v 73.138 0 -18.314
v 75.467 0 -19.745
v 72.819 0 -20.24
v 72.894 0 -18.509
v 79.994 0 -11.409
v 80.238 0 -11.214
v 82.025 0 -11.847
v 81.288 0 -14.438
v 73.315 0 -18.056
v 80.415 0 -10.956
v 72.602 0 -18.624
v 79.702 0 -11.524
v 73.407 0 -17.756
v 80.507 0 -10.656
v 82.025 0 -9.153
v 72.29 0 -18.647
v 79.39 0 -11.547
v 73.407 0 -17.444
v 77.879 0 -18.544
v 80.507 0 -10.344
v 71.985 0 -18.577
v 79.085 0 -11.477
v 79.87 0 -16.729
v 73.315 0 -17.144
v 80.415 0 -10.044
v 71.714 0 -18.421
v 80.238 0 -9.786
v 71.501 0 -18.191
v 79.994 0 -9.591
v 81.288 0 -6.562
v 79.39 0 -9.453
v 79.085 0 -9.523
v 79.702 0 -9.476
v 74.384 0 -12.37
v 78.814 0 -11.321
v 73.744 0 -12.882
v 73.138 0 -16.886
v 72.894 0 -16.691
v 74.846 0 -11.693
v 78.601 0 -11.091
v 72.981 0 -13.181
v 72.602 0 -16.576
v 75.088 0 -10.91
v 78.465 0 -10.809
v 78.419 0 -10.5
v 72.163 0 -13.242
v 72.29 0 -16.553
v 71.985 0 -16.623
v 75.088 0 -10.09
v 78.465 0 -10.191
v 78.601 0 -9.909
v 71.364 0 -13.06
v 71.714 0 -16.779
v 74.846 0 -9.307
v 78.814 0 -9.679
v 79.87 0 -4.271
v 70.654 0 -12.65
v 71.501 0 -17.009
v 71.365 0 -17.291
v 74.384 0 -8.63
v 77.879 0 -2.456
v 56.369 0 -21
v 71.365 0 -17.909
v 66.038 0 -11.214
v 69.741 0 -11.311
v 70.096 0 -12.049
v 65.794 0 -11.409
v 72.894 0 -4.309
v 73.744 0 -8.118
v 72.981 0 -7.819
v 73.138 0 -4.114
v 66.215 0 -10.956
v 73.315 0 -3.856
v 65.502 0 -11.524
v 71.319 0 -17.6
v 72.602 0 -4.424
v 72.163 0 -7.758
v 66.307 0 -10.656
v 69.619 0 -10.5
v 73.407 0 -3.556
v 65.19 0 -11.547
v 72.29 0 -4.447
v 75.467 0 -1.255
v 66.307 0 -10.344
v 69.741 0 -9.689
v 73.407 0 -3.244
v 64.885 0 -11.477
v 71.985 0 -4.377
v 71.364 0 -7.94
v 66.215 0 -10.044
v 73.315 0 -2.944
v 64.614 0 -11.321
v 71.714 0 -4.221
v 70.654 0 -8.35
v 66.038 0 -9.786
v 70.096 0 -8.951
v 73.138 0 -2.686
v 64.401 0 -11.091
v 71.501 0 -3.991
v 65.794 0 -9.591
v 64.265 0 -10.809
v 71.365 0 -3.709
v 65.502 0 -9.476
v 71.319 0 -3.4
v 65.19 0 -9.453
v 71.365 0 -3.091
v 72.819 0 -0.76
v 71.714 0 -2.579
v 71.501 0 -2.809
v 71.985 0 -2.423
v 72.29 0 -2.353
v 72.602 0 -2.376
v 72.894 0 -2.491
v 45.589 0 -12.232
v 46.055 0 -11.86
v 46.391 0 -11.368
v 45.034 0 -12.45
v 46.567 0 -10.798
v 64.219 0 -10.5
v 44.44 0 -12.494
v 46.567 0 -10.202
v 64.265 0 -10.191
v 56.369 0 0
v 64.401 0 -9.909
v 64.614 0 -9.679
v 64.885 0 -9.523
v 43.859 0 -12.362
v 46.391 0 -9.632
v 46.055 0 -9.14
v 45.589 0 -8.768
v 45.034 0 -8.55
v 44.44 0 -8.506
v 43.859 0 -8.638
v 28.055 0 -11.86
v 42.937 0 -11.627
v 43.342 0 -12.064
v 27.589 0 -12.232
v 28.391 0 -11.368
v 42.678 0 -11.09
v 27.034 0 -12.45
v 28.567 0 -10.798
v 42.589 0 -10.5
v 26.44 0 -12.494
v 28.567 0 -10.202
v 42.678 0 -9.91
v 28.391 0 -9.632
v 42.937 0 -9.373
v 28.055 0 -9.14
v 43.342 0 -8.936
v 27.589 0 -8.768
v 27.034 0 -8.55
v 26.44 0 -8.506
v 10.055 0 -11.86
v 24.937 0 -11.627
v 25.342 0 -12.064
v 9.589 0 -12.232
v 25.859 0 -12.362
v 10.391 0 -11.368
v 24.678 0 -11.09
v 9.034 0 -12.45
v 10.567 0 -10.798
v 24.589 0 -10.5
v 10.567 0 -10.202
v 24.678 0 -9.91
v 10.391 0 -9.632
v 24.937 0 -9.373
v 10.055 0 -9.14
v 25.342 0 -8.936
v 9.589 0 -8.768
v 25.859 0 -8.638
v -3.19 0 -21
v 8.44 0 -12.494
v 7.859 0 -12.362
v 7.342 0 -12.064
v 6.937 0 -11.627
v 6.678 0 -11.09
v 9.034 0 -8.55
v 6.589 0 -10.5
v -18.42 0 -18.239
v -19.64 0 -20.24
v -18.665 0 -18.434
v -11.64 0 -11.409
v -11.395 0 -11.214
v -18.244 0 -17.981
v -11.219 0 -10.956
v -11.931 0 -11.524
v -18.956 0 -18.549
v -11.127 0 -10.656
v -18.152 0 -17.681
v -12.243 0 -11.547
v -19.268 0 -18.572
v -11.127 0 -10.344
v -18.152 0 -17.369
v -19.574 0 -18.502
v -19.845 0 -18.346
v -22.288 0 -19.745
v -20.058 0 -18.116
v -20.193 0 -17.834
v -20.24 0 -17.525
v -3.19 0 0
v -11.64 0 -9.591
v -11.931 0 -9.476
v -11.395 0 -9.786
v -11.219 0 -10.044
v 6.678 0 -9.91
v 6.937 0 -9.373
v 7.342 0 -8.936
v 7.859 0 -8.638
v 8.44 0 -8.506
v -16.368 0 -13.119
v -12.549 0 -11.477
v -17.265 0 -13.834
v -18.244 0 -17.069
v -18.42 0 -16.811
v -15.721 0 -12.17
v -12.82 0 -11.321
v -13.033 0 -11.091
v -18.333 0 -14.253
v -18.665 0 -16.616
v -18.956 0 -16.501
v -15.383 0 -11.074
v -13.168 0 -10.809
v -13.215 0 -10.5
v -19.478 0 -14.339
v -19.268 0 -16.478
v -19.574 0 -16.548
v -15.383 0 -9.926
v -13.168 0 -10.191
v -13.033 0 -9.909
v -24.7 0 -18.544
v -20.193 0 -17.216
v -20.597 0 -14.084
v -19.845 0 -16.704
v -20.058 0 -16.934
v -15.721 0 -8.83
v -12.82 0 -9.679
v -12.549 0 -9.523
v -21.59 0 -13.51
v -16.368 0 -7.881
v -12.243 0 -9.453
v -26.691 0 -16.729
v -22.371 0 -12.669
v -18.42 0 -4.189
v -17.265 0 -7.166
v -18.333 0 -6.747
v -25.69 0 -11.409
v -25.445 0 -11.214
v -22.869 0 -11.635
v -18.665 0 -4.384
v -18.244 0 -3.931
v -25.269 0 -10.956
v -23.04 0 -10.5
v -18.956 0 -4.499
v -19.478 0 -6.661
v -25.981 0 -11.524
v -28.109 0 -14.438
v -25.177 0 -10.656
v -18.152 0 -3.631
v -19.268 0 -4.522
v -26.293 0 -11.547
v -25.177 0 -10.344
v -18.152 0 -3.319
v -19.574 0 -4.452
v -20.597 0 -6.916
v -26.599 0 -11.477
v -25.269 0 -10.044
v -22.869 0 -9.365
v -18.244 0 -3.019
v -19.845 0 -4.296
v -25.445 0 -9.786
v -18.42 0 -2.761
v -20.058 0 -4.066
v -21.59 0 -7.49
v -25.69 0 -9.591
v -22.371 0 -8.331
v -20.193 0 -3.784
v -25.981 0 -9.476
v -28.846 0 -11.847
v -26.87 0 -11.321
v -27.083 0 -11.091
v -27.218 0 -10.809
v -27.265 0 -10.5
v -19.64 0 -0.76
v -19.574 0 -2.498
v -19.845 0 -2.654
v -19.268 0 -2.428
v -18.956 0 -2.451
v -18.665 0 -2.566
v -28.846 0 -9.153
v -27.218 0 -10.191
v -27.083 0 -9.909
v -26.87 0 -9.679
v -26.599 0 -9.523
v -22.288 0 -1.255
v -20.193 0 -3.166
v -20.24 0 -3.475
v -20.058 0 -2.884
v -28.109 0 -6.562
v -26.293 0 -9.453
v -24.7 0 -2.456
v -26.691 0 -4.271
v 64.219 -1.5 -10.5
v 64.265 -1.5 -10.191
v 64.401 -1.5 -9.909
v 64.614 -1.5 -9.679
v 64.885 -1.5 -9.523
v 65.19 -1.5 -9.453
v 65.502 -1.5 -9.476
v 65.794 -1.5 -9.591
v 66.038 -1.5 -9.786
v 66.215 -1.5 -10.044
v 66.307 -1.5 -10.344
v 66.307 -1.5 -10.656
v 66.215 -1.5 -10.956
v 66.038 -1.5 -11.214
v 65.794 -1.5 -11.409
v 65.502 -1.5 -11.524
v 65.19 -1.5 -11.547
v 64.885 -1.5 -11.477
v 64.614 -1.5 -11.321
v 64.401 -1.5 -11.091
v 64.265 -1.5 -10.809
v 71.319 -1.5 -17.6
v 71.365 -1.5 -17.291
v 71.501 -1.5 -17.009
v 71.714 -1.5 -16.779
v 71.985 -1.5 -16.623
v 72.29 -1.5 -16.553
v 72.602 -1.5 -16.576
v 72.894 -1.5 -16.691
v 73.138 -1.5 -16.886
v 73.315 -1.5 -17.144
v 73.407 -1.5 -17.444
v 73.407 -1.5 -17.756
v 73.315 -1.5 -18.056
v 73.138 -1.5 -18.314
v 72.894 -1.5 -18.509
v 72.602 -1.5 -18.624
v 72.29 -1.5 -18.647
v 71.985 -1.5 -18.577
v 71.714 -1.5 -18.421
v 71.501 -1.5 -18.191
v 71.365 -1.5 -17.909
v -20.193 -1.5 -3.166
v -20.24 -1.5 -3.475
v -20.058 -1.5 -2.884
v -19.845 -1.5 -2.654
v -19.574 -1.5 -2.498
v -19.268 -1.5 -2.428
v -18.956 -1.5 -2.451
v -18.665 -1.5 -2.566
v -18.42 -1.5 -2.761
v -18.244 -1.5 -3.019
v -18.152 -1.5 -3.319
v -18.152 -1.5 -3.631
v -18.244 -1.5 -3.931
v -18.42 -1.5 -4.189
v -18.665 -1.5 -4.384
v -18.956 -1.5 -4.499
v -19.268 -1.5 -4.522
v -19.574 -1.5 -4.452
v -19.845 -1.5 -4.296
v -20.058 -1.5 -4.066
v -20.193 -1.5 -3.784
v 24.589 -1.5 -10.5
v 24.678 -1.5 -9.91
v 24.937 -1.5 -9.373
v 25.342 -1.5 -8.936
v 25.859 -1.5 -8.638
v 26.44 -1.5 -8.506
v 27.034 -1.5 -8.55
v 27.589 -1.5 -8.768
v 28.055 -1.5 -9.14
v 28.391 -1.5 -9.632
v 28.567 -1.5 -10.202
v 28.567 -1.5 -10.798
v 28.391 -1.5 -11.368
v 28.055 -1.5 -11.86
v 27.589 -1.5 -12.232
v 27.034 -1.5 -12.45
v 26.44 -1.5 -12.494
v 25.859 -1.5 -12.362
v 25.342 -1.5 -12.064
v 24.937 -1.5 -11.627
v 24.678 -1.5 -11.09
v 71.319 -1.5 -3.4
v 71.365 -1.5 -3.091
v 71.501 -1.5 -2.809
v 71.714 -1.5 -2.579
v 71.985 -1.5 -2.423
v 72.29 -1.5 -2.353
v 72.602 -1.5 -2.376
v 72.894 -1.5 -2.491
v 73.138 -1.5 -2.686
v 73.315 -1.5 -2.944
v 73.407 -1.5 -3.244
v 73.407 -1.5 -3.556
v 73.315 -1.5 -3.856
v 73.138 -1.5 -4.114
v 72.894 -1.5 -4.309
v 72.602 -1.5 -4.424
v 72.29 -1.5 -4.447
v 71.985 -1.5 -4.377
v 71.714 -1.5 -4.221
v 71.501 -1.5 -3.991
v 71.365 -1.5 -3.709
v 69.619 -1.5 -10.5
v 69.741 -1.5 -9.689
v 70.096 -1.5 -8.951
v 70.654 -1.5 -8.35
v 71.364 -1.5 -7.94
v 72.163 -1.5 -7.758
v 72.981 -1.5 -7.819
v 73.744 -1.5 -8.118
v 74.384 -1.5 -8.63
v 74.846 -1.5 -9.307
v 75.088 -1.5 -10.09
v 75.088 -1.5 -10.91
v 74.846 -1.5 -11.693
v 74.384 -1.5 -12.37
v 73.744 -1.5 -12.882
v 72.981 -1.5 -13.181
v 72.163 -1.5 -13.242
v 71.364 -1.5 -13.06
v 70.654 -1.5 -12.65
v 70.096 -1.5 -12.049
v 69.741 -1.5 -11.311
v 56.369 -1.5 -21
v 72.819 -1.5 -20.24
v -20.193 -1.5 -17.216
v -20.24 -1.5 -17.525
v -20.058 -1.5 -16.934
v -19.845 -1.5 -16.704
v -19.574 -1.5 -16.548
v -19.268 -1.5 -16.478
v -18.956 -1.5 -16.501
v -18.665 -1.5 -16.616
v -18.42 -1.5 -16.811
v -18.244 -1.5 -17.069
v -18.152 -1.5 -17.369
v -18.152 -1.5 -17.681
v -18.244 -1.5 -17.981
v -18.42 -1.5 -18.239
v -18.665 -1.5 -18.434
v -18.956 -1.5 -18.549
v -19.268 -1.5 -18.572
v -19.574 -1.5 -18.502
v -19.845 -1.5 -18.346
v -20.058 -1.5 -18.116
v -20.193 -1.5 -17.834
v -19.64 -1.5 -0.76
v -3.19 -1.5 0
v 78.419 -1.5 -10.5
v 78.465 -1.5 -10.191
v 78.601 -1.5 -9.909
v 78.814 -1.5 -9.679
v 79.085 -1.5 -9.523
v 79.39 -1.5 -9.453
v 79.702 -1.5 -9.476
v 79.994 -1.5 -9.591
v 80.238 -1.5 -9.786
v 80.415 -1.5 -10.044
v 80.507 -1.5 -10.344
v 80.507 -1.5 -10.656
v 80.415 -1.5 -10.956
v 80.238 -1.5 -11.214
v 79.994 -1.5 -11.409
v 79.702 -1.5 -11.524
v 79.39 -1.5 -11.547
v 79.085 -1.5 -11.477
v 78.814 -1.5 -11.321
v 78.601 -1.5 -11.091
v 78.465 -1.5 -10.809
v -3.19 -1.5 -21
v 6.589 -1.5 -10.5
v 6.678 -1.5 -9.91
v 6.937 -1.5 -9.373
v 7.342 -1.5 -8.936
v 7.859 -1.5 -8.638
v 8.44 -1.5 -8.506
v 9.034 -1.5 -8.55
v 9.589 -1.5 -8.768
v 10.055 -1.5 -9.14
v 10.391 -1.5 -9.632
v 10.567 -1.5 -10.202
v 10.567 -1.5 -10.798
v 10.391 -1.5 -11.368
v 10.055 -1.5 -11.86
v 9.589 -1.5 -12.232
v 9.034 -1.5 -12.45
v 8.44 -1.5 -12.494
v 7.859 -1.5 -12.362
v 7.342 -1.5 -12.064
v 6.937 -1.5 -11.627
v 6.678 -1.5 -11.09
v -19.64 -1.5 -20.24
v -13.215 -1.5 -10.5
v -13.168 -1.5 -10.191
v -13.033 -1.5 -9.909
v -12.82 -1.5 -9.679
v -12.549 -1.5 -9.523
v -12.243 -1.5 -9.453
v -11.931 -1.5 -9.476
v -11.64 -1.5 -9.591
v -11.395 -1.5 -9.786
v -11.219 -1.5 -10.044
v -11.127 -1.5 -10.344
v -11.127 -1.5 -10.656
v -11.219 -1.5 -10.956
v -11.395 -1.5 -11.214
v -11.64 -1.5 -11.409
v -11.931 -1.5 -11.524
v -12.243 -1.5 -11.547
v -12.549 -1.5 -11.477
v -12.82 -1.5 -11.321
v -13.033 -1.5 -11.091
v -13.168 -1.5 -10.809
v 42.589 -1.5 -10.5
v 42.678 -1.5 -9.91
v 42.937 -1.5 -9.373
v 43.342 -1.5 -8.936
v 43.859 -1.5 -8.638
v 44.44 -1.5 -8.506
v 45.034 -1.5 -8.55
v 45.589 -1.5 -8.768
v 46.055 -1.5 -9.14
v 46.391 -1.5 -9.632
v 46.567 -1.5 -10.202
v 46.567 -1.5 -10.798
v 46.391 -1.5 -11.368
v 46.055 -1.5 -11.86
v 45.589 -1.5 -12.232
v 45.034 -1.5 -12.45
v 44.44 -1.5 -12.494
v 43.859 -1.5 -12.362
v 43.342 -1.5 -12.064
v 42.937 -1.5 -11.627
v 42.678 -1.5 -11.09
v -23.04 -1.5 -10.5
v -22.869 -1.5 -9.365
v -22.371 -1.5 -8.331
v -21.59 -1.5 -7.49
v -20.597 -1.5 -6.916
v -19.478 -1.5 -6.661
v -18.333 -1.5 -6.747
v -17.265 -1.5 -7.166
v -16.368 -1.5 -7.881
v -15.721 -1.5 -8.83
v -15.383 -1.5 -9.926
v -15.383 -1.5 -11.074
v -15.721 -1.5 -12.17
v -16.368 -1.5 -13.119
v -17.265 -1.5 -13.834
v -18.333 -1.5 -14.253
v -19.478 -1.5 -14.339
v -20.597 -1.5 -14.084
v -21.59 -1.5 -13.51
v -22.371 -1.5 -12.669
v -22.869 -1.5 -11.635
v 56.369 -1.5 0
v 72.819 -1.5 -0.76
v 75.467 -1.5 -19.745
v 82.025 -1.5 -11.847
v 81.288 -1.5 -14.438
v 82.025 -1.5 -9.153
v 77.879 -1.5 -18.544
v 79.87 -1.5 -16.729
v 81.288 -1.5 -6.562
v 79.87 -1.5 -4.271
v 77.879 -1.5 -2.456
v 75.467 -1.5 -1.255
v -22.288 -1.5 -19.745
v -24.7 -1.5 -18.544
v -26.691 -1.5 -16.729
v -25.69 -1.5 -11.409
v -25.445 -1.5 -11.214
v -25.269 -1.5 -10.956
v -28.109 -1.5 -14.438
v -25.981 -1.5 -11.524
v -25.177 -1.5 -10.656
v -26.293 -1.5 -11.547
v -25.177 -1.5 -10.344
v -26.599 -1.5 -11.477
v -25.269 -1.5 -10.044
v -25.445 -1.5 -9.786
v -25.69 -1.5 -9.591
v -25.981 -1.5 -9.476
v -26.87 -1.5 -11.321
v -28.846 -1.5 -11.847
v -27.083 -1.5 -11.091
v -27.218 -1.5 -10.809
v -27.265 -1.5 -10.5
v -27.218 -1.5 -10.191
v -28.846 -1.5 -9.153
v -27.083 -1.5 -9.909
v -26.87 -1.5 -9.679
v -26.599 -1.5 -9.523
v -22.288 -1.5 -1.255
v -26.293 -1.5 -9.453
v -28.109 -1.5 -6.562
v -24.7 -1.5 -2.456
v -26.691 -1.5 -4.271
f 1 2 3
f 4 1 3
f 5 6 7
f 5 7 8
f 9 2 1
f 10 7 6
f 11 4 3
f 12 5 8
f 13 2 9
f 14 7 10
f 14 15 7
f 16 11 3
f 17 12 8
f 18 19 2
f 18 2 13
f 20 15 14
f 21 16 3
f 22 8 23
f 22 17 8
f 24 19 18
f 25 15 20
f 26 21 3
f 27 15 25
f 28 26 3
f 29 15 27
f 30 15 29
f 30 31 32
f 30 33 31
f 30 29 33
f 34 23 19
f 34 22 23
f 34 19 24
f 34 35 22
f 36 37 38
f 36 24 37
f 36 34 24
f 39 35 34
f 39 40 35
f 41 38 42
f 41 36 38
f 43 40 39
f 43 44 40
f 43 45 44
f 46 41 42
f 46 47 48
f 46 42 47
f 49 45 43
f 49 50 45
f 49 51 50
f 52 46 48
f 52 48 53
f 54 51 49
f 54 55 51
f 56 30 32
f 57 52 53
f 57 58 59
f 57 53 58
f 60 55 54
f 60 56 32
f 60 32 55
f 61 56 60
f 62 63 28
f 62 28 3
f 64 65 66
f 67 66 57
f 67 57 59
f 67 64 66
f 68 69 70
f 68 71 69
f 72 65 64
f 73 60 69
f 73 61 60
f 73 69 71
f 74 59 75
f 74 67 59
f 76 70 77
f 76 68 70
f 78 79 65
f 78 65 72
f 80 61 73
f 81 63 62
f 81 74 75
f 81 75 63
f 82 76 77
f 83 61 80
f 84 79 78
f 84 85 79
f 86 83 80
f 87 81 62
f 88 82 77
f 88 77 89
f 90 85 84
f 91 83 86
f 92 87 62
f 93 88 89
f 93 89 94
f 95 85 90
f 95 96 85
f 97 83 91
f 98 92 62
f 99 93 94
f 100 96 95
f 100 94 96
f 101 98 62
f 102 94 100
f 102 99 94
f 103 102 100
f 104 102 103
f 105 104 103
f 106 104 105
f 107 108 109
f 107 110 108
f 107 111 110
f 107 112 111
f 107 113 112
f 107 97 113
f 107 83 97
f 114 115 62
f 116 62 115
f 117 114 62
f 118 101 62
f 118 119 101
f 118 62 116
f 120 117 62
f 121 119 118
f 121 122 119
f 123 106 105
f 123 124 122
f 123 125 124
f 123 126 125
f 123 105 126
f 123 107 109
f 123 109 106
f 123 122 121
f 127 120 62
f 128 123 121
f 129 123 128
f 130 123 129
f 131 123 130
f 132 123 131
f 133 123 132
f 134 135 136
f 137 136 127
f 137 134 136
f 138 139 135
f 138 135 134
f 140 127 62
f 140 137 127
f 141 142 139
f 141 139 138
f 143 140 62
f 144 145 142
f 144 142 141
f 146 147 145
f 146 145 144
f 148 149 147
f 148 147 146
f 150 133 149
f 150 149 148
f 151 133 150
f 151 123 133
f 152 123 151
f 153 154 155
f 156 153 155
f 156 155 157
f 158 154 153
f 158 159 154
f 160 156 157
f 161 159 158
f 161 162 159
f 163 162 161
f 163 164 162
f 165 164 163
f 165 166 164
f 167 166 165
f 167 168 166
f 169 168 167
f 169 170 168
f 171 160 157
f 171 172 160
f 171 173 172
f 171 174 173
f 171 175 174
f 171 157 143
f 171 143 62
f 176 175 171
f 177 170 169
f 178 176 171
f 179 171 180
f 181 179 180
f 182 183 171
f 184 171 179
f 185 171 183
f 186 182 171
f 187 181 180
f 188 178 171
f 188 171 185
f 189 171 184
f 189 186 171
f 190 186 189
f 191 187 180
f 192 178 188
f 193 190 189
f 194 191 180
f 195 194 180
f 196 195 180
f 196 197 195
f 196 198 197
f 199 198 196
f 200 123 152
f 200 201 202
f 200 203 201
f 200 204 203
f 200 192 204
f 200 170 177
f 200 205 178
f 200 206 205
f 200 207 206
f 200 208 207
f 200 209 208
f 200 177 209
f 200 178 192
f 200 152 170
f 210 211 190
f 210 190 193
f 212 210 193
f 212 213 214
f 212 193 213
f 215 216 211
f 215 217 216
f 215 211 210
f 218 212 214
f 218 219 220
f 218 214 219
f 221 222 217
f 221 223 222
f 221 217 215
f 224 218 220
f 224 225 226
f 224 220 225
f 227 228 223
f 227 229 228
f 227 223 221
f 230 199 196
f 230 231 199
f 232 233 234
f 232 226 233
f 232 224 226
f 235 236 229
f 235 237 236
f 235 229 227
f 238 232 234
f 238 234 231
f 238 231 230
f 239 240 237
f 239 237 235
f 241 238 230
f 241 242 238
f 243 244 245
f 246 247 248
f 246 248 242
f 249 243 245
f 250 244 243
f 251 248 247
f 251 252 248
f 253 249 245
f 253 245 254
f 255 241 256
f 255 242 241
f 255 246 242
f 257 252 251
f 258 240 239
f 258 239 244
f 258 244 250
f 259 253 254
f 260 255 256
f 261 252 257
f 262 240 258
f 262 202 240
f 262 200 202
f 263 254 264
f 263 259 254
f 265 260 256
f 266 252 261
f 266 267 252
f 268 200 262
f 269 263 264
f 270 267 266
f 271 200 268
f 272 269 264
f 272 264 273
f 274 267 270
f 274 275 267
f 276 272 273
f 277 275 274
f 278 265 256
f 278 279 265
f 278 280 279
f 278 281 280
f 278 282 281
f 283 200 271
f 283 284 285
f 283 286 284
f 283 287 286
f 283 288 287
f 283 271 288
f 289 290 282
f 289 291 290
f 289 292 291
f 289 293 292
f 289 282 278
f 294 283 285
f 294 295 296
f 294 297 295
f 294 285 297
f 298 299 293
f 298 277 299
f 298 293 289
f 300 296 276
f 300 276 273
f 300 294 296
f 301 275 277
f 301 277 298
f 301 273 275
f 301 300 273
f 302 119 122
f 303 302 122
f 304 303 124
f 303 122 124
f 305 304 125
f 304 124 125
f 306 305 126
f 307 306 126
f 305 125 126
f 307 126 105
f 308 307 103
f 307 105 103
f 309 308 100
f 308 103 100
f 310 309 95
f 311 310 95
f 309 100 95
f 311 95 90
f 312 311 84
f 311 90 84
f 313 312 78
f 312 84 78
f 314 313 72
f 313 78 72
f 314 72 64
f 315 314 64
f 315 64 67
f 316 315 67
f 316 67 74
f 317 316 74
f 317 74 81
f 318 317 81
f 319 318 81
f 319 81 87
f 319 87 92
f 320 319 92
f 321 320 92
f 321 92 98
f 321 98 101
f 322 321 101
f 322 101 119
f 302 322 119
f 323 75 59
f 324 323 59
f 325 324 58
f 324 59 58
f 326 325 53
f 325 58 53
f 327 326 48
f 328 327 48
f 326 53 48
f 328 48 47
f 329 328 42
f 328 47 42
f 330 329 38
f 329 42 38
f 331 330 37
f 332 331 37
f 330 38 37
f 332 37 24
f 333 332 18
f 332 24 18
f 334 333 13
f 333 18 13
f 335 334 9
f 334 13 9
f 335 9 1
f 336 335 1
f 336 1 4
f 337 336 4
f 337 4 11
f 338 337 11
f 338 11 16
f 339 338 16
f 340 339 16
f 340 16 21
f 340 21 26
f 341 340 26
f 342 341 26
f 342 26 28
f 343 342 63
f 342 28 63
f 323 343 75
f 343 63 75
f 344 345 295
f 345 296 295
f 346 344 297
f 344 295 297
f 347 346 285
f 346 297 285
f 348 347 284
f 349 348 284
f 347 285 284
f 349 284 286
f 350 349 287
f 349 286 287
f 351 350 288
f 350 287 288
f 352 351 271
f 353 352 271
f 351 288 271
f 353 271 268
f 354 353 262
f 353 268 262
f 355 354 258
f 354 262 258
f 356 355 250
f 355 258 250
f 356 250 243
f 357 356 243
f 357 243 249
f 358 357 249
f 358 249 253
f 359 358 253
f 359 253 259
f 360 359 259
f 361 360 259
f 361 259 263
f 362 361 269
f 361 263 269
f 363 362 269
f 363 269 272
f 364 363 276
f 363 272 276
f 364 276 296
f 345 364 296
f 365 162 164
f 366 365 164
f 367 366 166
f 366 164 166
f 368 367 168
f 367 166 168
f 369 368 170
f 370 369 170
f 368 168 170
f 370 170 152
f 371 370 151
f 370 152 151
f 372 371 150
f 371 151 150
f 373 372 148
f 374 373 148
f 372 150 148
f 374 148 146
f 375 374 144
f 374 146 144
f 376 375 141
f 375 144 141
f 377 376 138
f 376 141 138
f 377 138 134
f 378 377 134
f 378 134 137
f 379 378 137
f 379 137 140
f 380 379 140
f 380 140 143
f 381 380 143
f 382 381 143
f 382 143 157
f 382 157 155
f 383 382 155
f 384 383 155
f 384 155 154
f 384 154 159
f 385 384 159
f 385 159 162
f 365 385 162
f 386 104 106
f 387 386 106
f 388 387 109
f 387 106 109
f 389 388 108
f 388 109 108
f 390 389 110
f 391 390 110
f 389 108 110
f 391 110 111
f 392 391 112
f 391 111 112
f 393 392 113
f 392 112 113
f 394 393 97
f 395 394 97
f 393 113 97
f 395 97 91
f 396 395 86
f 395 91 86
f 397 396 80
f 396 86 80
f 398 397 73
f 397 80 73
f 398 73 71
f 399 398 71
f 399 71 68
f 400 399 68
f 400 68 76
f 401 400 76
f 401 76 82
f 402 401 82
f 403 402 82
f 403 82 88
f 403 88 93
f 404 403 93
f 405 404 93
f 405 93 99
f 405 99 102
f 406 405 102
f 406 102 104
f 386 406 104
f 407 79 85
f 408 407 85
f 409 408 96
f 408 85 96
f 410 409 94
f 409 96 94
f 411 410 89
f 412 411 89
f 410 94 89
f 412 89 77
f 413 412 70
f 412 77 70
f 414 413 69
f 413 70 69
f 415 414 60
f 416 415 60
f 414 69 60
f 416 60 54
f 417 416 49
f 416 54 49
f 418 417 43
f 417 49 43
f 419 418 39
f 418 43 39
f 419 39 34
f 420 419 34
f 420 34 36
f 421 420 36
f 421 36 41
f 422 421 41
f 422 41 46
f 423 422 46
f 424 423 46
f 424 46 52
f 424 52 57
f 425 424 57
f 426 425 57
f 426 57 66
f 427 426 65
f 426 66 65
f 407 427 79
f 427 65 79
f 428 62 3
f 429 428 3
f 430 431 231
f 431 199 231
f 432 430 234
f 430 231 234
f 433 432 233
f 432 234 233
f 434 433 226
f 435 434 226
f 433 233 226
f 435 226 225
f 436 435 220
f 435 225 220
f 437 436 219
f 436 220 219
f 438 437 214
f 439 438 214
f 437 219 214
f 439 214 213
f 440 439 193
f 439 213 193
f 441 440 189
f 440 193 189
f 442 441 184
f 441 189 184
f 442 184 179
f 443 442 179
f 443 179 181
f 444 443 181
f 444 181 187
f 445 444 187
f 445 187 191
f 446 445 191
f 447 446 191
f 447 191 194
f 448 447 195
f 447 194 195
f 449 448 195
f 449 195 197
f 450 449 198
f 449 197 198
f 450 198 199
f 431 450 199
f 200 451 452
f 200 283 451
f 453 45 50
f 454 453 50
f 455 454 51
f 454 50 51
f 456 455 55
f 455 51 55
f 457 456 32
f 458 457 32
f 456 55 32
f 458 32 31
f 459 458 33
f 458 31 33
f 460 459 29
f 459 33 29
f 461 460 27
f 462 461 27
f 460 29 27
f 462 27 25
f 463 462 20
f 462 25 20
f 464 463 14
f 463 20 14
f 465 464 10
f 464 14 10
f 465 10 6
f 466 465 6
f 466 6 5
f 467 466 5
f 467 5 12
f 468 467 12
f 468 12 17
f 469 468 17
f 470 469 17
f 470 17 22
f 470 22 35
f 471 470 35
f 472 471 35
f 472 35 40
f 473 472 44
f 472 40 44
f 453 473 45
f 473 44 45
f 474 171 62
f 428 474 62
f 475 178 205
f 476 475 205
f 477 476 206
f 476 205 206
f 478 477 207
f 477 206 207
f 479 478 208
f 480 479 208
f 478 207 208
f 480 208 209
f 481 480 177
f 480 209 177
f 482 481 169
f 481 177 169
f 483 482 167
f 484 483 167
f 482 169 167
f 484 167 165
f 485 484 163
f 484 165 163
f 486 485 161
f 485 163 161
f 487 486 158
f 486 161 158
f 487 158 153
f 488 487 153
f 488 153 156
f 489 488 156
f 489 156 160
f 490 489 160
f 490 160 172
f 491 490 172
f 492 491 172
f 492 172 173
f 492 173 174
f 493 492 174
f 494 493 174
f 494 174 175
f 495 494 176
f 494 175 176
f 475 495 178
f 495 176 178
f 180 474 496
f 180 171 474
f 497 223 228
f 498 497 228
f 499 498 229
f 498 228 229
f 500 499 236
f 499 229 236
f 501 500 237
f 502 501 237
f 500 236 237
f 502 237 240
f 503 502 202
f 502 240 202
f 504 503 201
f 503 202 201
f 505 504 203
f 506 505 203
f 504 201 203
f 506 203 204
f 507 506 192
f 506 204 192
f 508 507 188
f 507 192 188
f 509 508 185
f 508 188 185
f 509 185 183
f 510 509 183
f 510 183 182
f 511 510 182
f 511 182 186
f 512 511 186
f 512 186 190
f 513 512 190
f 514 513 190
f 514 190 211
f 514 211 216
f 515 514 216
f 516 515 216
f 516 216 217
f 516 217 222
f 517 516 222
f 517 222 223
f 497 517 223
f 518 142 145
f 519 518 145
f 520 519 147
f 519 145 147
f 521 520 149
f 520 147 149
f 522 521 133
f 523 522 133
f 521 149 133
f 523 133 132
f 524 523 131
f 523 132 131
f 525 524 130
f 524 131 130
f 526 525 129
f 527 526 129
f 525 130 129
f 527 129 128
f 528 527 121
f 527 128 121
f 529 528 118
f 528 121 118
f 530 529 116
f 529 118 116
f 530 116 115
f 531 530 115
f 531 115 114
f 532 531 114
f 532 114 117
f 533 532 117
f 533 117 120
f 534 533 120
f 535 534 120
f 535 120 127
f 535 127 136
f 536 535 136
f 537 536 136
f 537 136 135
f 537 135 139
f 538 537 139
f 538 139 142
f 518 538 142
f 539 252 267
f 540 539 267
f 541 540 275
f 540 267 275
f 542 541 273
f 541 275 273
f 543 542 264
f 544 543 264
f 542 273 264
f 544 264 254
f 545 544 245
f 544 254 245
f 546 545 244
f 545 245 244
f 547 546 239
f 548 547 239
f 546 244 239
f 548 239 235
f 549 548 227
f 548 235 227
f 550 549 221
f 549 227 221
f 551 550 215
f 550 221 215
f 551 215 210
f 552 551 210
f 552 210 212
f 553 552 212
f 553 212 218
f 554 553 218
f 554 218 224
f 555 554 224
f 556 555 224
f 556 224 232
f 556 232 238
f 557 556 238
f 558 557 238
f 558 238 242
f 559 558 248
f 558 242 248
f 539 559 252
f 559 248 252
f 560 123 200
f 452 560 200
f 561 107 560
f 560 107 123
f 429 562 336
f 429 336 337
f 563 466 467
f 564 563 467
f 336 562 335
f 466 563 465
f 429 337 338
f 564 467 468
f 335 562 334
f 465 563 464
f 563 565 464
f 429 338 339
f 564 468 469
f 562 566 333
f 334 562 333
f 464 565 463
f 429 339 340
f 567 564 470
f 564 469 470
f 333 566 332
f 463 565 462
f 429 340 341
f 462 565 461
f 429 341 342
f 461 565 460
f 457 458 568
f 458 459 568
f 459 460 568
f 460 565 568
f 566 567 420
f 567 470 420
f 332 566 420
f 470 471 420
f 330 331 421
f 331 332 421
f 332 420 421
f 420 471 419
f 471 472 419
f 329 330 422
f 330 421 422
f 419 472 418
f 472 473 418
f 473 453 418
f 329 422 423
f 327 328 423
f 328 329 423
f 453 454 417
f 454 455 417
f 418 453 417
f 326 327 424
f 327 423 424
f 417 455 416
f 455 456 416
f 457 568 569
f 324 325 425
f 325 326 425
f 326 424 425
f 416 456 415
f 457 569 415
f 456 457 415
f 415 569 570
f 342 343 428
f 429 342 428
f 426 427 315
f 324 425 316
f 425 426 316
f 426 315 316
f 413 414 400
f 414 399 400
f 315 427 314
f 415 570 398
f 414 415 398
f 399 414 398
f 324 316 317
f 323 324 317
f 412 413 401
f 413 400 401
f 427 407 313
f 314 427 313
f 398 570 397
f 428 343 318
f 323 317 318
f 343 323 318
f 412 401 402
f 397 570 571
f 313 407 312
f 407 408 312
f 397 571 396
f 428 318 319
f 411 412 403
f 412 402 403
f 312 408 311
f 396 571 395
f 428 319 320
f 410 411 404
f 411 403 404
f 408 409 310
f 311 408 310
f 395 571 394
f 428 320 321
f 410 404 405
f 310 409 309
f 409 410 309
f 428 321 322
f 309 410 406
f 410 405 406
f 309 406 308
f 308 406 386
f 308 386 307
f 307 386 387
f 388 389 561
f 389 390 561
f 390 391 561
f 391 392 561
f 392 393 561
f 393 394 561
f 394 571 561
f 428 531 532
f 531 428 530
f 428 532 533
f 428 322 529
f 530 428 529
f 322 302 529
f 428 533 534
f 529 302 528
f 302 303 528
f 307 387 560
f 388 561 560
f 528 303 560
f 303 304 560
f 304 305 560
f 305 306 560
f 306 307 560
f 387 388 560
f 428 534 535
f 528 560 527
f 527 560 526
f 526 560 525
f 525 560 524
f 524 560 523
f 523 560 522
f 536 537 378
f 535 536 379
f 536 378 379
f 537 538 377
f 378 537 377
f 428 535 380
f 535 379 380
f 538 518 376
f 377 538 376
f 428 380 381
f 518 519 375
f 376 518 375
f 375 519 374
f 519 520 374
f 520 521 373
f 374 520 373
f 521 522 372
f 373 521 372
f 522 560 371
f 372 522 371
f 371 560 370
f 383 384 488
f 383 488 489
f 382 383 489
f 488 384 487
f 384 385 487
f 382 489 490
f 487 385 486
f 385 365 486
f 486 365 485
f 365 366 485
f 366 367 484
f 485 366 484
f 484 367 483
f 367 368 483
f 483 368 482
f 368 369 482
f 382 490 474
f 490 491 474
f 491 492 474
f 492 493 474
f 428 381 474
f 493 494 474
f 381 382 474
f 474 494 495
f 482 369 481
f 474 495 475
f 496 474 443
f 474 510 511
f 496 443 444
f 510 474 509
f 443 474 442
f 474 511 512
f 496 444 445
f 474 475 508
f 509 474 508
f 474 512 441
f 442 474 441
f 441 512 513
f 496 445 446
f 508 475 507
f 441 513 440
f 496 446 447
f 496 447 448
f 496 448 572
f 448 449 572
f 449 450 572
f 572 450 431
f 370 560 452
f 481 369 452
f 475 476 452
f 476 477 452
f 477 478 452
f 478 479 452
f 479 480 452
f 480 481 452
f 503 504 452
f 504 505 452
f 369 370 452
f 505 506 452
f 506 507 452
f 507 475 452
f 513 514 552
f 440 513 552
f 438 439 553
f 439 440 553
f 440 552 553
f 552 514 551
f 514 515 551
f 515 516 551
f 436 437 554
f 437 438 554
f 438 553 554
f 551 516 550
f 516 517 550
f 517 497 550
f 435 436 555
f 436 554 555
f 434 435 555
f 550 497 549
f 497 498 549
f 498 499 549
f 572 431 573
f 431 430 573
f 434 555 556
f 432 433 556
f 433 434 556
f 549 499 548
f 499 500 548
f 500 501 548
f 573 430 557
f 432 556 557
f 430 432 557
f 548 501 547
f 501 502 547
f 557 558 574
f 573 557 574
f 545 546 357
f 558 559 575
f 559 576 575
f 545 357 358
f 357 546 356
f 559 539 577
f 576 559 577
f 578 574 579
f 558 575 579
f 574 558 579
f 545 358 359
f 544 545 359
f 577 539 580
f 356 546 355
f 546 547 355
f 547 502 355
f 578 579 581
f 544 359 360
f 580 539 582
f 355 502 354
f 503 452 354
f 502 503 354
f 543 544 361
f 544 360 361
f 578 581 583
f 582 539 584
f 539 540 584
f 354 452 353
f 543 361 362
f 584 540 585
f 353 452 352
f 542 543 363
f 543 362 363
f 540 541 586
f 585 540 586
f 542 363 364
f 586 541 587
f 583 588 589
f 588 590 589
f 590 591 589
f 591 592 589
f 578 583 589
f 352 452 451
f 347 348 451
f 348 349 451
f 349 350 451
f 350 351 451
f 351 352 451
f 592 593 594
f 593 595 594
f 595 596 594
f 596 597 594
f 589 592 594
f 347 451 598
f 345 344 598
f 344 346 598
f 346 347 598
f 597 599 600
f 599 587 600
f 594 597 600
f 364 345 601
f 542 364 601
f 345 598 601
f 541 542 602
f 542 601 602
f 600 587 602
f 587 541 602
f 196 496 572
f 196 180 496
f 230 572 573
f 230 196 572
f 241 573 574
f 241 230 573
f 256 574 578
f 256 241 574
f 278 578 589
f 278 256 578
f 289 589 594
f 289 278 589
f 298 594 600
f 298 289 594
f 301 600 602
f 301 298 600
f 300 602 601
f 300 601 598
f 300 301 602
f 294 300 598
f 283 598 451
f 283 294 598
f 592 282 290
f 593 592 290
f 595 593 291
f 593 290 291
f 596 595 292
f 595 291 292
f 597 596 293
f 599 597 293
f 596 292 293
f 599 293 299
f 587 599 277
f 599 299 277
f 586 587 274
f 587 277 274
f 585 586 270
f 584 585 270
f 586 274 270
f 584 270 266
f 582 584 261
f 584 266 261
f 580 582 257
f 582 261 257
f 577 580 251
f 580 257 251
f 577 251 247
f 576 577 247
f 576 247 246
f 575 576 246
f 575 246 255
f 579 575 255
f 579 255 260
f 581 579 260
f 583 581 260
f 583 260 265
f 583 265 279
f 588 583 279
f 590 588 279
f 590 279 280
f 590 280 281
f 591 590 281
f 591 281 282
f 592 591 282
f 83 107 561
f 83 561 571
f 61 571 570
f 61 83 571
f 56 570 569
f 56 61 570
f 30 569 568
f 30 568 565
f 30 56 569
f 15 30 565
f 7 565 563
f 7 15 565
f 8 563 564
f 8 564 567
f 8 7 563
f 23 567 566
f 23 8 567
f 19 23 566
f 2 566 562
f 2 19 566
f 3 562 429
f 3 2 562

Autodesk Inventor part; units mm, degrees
ref_plane "YZ Plane" through (0, 0, 0) normal (1, 0, 0) x (0, 1, 0)
ref_plane "XZ Plane" through (0, 0, 0) normal (0, 1, 0) x (-1, 0, 0)
ref_plane "XY Plane" through (0, 0, 0) normal (0, 0, 1) x (1, 0, 0)
sketch "Sketch1" plane through (0, 0, 0) normal (0, 1, 0) x (-1, 0, 0)
  line L0 (-0.4496, -21) -> (-0.4496, 0)
  line L1 (-52.7289, -21) -> (-52.7289, 0)
  circle A0 centre (-44.5893, -10.5) radius 2
  circle A1 centre (-26.5893, -10.5) radius 2
  circle A2 centre (-8.5893, -10.5) radius 2
  circle A3 centre (12.165, -10.5) radius 1.05
  circle A4 centre (26.215, -10.5) radius 1.05
  circle A5 centre (19.19, -3.475) radius 1.05
  circle A6 centre (19.19, -17.525) radius 1.05
  circle A7 centre (19.19, -10.5) radius 3.85
  circle A8 centre (-72.3686, -10.5) radius 2.75
  circle A9 centre (-72.3686, -17.6) radius 1.05
  circle A10 centre (-79.4686, -10.5) radius 1.05
  circle A11 centre (-72.3686, -3.4) radius 1.05
  circle A12 centre (-65.2686, -10.5) radius 1.05
  arc A13 (19.6402, -20.2396) -> (19.6402, -0.7604) centre (19.19, -10.5) ccw
  line L2 (3.19, -21) -> (19.6402, -20.2396)
  line L3 (19.6402, -0.7604) -> (3.19, 0)
  line L4 (-56.3686, 0) -> (3.19, 0)
  line L5 (3.19, -21) -> (-56.3686, -21)
  line L6 (-72.8188, -0.7604) -> (-56.3686, 0)
  arc A14 (-72.8188, -0.7604) -> (-72.8188, -20.2396) centre (-72.3686, -10.5) ccw
  line L7 (-56.3686, -21) -> (-72.8188, -20.2396)
  line L8 (-53.1786, -21) -> (-53.1786, 0)
  line L9 (-52.2793, 0) -> (-52.2793, -21)
  line L10 (-0.8993, -21) -> (-0.8993, 0)
  line L11 (0, 0) -> (0, -21)
extrude "Plate1" add sketch "Sketch1" against normal blind 1.5
equation "\"d0\" = Thickness"
equation "\"BendReliefWidth\" = Thickness"
equation "\"BendReliefDepth\" = 0.5 * Thickness"
equation "\"CornerReliefSize\" = 4 * Thickness"
equation "\"MinimumRemnant\" = 2 * Thickness"
equation "\"TransitionRadius\" = BendRadius"
equation "\"JacobiRadiusSize\" = BendRadius"
equation "\"GapSize\" = Thickness"
equation "\"Thickness\" = 1.5"
equation "\"BendRadius\" = 0.31"
properties part number "CAM_ㄷ_frame_1" material "Aluminum 6061"
